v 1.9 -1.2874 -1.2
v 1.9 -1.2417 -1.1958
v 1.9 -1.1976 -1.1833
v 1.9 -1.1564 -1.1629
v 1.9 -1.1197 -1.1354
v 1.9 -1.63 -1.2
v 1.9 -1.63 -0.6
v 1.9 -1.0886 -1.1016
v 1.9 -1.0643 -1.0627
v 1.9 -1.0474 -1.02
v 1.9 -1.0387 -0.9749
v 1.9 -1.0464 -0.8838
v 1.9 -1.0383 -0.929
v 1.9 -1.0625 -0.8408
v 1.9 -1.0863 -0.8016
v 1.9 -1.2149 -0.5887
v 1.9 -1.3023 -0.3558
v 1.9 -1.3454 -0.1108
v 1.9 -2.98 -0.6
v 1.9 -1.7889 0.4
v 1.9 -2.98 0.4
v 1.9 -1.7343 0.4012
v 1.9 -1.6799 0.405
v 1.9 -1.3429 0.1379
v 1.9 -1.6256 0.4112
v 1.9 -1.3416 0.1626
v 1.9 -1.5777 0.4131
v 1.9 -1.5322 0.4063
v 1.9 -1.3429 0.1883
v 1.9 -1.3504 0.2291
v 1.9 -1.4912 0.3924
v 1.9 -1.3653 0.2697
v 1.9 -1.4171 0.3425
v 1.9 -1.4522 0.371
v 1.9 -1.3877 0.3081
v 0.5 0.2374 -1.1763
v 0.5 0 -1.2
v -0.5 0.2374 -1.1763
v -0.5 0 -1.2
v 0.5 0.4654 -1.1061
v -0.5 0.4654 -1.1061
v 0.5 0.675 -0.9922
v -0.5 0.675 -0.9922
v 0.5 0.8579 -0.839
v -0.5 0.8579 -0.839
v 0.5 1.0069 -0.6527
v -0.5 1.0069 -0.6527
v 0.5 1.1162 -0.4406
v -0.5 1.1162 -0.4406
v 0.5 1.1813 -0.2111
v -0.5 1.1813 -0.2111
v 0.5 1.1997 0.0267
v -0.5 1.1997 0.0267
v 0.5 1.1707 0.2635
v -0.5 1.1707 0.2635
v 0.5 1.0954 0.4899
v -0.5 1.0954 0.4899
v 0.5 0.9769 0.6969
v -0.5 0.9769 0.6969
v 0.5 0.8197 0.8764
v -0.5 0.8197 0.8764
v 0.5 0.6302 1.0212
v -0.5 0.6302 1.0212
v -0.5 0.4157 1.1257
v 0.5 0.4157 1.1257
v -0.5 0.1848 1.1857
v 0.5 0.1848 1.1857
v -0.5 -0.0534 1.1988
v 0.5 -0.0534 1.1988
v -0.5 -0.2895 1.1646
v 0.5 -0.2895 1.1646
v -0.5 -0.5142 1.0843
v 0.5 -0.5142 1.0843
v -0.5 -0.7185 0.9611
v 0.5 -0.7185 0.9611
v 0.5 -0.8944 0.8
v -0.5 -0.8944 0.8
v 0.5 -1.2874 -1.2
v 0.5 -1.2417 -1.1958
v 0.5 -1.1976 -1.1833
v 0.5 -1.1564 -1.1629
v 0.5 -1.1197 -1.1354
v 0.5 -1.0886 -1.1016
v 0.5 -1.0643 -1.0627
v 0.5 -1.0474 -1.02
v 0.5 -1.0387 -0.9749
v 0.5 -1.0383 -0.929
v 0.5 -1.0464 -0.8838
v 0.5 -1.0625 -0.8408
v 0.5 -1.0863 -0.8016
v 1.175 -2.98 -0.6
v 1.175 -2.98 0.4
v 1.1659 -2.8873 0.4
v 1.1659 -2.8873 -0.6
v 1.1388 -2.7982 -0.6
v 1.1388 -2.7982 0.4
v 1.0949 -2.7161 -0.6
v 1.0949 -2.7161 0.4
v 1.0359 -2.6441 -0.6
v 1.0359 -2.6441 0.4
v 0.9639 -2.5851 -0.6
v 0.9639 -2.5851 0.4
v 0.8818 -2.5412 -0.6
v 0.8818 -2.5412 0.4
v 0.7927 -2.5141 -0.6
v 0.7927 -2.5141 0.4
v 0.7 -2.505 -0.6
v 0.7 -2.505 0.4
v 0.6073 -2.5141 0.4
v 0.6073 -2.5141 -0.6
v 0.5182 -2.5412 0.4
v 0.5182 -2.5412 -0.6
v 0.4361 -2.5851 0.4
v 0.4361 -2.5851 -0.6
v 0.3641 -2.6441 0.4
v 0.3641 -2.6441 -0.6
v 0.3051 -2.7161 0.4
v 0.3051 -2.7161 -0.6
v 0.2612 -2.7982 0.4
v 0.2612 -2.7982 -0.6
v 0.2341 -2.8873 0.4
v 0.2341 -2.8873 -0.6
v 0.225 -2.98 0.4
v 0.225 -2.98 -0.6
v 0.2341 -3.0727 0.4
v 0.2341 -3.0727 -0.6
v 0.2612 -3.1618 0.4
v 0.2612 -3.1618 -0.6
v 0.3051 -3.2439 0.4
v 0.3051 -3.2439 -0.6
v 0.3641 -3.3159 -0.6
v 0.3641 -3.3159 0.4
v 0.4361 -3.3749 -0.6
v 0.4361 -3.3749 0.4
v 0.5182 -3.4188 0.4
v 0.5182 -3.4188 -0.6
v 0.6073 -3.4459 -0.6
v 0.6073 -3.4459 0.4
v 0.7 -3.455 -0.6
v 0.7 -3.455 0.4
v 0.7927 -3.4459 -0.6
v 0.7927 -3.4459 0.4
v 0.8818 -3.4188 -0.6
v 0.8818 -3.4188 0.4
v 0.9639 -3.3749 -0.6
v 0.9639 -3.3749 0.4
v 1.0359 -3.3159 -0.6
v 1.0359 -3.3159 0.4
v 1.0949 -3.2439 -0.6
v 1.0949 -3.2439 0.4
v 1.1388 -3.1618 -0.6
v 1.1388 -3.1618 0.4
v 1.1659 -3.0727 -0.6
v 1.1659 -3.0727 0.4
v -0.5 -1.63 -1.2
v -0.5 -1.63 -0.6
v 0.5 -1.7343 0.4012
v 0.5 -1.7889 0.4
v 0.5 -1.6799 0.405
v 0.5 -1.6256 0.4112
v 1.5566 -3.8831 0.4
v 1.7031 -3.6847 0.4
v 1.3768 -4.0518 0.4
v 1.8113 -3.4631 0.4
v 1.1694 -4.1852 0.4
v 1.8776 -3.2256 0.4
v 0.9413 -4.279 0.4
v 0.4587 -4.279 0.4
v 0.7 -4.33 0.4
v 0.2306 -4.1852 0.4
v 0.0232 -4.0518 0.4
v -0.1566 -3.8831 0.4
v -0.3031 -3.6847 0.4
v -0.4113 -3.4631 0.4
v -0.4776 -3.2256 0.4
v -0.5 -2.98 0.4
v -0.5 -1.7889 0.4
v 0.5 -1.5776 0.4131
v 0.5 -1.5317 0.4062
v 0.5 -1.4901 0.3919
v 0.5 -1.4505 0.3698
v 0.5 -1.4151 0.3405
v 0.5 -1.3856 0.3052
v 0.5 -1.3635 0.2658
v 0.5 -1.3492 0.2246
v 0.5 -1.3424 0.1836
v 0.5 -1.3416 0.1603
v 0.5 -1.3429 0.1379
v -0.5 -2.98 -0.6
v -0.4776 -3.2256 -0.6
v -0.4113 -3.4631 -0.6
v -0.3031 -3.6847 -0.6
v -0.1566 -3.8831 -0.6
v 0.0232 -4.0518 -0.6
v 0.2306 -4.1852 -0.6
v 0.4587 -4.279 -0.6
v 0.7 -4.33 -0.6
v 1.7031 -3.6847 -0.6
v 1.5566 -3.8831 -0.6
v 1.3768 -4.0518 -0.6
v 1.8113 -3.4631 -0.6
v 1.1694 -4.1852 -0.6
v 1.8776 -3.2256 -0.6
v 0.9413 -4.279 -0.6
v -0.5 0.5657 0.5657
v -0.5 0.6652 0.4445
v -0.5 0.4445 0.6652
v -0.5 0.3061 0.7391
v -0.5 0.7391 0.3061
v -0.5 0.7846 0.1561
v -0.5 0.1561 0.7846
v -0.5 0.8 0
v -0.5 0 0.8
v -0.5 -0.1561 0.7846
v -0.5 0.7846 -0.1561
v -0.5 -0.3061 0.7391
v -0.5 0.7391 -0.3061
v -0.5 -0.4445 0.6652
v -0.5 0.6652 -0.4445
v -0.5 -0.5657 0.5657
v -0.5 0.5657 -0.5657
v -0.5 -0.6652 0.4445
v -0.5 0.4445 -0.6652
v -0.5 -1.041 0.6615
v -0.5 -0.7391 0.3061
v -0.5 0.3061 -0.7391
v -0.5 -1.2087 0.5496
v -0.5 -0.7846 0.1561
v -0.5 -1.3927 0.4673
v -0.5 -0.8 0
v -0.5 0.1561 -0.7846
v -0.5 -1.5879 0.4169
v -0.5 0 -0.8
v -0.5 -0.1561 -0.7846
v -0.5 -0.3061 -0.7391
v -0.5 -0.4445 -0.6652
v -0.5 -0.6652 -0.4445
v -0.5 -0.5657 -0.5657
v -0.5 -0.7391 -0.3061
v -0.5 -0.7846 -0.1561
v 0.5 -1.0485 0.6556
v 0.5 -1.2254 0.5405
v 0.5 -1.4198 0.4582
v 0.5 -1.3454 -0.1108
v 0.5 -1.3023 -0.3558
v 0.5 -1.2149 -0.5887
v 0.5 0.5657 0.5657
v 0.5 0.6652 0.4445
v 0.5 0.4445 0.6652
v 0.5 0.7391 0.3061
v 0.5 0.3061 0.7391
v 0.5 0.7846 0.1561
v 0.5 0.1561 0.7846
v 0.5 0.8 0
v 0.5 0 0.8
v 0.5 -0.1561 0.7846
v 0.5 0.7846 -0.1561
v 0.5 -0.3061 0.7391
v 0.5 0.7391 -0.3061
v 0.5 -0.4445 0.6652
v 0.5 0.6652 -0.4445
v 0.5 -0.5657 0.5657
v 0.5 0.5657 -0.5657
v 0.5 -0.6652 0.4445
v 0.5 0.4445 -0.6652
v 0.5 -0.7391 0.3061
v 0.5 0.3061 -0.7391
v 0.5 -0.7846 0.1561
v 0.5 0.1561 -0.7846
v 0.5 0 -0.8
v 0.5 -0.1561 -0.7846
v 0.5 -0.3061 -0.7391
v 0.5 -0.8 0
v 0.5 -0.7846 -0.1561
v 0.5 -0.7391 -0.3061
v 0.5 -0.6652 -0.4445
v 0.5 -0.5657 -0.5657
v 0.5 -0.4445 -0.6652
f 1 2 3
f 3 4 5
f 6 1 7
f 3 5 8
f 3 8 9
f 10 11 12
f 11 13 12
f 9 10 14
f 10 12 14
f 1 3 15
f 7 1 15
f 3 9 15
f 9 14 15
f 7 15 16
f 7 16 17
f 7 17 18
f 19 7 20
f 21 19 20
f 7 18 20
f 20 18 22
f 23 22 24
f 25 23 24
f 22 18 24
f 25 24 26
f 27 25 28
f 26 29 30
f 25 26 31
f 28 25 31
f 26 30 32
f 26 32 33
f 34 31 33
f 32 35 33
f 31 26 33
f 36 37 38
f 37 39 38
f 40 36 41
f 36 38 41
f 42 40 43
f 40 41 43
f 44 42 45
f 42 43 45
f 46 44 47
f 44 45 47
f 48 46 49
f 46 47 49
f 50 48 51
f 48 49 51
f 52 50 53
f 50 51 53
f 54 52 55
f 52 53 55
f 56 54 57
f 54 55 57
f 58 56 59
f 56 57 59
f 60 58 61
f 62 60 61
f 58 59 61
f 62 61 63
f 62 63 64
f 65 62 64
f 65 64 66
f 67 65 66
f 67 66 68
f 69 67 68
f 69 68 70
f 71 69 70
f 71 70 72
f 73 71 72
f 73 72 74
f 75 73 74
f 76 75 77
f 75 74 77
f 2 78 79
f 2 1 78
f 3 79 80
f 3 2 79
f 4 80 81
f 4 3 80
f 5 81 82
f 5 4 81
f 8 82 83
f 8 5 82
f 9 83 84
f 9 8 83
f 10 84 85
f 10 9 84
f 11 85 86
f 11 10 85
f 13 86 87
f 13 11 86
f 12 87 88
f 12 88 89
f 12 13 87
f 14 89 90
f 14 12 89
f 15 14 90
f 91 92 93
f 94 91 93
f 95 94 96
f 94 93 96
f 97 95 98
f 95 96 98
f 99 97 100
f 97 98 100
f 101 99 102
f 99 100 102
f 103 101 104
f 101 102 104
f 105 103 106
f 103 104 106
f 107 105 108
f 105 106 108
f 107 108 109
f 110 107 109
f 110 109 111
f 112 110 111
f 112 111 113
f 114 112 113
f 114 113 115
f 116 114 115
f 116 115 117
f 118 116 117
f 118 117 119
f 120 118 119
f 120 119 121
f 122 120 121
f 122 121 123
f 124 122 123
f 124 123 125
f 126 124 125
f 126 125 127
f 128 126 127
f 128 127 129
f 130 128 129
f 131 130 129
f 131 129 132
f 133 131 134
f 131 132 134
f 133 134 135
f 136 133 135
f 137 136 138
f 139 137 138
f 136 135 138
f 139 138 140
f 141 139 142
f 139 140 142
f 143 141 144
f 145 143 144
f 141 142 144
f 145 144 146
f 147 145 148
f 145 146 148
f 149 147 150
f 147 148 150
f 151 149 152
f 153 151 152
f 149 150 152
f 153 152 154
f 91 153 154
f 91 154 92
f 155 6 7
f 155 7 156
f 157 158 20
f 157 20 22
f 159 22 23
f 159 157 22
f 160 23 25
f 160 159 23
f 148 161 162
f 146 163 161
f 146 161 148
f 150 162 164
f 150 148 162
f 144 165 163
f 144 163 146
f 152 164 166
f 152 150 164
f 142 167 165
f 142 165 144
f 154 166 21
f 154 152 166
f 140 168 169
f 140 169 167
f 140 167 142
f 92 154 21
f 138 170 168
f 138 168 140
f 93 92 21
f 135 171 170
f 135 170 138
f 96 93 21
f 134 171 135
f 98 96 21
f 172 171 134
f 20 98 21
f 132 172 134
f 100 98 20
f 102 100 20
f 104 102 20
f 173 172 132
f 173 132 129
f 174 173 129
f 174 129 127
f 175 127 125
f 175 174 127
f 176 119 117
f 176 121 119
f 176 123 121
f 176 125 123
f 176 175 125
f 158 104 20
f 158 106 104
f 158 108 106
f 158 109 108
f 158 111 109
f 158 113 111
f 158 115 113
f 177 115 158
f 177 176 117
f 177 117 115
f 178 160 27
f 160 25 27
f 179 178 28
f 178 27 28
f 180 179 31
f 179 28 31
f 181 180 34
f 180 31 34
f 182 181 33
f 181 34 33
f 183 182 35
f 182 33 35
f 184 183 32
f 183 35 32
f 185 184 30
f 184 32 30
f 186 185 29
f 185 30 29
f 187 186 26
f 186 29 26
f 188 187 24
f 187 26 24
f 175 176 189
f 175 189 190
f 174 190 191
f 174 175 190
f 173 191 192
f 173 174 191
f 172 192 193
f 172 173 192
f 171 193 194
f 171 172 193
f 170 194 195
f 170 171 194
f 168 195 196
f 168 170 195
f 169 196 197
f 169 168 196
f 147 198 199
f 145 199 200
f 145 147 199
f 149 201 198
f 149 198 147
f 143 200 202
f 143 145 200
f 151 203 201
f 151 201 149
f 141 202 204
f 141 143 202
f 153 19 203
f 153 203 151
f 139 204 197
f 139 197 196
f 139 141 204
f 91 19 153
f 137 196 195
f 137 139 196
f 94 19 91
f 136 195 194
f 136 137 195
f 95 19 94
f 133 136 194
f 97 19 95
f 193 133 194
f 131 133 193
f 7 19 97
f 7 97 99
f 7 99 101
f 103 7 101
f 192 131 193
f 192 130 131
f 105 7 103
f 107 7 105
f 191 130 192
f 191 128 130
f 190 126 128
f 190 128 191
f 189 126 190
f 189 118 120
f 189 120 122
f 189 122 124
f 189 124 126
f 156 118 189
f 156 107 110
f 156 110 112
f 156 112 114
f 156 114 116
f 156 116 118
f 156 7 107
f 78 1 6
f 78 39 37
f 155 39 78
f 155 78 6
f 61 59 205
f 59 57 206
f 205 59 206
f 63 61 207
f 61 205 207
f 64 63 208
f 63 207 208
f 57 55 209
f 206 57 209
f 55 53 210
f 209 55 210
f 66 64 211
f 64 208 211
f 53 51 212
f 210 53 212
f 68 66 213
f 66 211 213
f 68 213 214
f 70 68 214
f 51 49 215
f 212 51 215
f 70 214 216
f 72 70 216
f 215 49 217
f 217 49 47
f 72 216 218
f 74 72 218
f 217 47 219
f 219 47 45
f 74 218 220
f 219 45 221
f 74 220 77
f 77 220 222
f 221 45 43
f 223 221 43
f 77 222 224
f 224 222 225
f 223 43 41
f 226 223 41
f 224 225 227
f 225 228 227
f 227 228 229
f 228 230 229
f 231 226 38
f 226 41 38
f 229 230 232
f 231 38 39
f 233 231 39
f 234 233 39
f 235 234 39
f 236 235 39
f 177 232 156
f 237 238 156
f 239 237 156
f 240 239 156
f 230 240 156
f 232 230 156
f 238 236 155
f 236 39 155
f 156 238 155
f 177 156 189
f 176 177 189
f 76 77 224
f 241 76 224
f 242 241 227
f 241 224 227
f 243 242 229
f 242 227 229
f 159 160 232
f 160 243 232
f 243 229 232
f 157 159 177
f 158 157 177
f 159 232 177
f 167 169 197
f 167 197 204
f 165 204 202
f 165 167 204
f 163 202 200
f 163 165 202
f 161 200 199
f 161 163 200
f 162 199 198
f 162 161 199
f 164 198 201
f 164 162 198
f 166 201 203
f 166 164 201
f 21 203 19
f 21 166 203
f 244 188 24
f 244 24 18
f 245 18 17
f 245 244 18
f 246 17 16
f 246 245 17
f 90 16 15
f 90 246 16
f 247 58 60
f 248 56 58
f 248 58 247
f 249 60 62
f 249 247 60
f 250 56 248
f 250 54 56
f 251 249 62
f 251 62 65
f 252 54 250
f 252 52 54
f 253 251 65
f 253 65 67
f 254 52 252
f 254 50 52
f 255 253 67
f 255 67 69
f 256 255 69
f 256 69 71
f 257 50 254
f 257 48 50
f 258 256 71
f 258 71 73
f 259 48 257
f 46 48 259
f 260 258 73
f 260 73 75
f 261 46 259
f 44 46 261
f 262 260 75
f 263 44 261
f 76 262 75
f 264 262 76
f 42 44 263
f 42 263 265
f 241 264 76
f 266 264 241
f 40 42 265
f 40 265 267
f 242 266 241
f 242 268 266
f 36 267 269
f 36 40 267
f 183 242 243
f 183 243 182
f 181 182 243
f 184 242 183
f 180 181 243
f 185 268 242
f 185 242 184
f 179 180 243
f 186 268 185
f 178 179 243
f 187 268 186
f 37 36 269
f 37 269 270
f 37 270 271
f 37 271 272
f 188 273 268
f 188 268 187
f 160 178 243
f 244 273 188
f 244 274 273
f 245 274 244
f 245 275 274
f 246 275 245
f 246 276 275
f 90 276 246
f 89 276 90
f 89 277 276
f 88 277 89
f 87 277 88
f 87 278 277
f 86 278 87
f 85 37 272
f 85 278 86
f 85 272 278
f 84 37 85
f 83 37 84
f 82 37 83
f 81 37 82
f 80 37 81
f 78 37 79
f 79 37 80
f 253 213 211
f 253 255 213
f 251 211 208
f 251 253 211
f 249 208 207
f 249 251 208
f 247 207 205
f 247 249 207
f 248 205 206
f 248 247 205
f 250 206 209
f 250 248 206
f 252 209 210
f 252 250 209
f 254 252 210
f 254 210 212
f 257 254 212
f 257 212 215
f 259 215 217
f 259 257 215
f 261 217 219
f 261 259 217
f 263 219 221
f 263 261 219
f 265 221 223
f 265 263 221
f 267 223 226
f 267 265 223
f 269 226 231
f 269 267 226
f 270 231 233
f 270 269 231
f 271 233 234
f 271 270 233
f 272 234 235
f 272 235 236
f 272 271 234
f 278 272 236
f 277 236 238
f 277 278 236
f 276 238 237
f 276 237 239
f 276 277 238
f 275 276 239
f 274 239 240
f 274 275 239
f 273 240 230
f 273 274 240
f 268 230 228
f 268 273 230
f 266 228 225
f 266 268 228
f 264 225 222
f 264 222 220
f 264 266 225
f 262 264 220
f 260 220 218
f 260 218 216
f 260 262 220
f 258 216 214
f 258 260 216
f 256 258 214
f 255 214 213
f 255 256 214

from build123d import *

# Parameters (mm, degrees)
SKETCH1_R               = 0.8
BOSS_EXTRUDE1_DEPTH     = 0.5
BOSS_EXTRUDE2_DEPTH     = 1.4
FILLET1_R               = 0.25
SKETCH3_W               = 2.4
SKETCH3_H               = 2.7
CUT_EXTRUDE1_DEPTH      = 0.6
M1_2_TAPPED_HOLE1_D     = 0.95
CUT_EXTRUDE2_DEPTH      = 6.059535711
CUT_EXTRUDE2_DEPTH_BACK = 6.059535711


with BuildPart() as part:
    # Sketch1 → Boss-Extrude1 (new, symmetric)
    with BuildSketch(Plane(origin=(0, 0, 0), x_dir=(0, 1, 0), z_dir=(-1, 0, 0))):
        with BuildLine():
            Line((-4.33, 1.2), (0, 1.2))
            ThreePointArc((0, 1.2), (1.095445115, -0.489897949), (-0.894427191, -0.8))
            ThreePointArc((-0.894427191, -0.8), (-1.298956433, -0.504554885), (-1.788854382, -0.4))
            Line((-1.788854382, -0.4), (-4.33, -0.4))
            Line((-4.33, -0.4), (-4.33, 1.2))
        make_face()
        with Locations(Location((0, 0, 0), (0, 0, 270))):
            Circle(SKETCH1_R, mode=Mode.SUBTRACT)
    extrude(amount=BOSS_EXTRUDE1_DEPTH, both=True)

    # Sketch2 → Boss-Extrude2 (add)
    with BuildSketch(Plane(origin=(0.5, 0, 0), x_dir=(0, 0, -1), z_dir=(1, 0, 0))):
        with BuildLine():
            Line((1.2, -0.618465844), (1.2, -4.33))
            Line((1.2, -4.33), (-0.4, -4.33))
            Line((-0.4, -4.33), (-0.4, -1.788854382))
            ThreePointArc((-0.4, -1.788854382), (-0.433626648, -1.506767153), (-0.532622008, -1.240489338))
            ThreePointArc((-0.532622008, -1.240489338), (0.456154198, -1.270599601), (1.2, -0.618465844))
        make_face()
    extrude(amount=BOSS_EXTRUDE2_DEPTH)

    # Fillet1
    fillet1_edges = [part.edges().sort_by_distance(p)[0] for p in [
        (1.2, -0.618465844, -1.2),
        (1.2, -1.240489338, 0.532622008),
    ]]
    fillet(fillet1_edges, radius=FILLET1_R)

    # Sketch3 → Cut-Extrude1 (cut)
    with BuildSketch(Plane(origin=(0, 0, -1.2), x_dir=(-1, 0, 0), z_dir=(0, 0, -1))):
        with Locations((-0.7, -2.98)):
            Rectangle(SKETCH3_W, SKETCH3_H)
    extrude(amount=-CUT_EXTRUDE1_DEPTH, mode=Mode.SUBTRACT)

    # M1.2 Tapped Hole1 (through all)
    with Locations(Plane(origin=(0, 0, -0.6), x_dir=(-1, 0, 0), z_dir=(0, 0, -1))):
        with Locations((-0.7, -2.98)):
            Hole(M1_2_TAPPED_HOLE1_D / 2)

    # Sketch6 → Cut-Extrude2 (cut, two sides: drawn at the far end of the back side and taken through both)
    with BuildSketch(Plane(origin=(0, 0, -0.6), x_dir=(-1, 0, 0), z_dir=(0, 0, -1)).offset(-CUT_EXTRUDE2_DEPTH_BACK)):
        with BuildLine():
            ThreePointArc((-0.7, -4.33), (-1.556634543, -3.883119593), (-1.9, -2.98))
            Line((-1.9, -2.98), (-1.9, -4.33))
            Line((-1.9, -4.33), (-0.7, -4.33))
        make_face()
        with BuildLine():
            ThreePointArc((0.5, -2.98), (0.156634543, -3.883119593), (-0.7, -4.33))
            Line((-0.7, -4.33), (0.5, -4.33))
            Line((0.5, -4.33), (0.5, -2.98))
        make_face()
    extrude(amount=CUT_EXTRUDE2_DEPTH + CUT_EXTRUDE2_DEPTH_BACK, mode=Mode.SUBTRACT)


solid = part.part
